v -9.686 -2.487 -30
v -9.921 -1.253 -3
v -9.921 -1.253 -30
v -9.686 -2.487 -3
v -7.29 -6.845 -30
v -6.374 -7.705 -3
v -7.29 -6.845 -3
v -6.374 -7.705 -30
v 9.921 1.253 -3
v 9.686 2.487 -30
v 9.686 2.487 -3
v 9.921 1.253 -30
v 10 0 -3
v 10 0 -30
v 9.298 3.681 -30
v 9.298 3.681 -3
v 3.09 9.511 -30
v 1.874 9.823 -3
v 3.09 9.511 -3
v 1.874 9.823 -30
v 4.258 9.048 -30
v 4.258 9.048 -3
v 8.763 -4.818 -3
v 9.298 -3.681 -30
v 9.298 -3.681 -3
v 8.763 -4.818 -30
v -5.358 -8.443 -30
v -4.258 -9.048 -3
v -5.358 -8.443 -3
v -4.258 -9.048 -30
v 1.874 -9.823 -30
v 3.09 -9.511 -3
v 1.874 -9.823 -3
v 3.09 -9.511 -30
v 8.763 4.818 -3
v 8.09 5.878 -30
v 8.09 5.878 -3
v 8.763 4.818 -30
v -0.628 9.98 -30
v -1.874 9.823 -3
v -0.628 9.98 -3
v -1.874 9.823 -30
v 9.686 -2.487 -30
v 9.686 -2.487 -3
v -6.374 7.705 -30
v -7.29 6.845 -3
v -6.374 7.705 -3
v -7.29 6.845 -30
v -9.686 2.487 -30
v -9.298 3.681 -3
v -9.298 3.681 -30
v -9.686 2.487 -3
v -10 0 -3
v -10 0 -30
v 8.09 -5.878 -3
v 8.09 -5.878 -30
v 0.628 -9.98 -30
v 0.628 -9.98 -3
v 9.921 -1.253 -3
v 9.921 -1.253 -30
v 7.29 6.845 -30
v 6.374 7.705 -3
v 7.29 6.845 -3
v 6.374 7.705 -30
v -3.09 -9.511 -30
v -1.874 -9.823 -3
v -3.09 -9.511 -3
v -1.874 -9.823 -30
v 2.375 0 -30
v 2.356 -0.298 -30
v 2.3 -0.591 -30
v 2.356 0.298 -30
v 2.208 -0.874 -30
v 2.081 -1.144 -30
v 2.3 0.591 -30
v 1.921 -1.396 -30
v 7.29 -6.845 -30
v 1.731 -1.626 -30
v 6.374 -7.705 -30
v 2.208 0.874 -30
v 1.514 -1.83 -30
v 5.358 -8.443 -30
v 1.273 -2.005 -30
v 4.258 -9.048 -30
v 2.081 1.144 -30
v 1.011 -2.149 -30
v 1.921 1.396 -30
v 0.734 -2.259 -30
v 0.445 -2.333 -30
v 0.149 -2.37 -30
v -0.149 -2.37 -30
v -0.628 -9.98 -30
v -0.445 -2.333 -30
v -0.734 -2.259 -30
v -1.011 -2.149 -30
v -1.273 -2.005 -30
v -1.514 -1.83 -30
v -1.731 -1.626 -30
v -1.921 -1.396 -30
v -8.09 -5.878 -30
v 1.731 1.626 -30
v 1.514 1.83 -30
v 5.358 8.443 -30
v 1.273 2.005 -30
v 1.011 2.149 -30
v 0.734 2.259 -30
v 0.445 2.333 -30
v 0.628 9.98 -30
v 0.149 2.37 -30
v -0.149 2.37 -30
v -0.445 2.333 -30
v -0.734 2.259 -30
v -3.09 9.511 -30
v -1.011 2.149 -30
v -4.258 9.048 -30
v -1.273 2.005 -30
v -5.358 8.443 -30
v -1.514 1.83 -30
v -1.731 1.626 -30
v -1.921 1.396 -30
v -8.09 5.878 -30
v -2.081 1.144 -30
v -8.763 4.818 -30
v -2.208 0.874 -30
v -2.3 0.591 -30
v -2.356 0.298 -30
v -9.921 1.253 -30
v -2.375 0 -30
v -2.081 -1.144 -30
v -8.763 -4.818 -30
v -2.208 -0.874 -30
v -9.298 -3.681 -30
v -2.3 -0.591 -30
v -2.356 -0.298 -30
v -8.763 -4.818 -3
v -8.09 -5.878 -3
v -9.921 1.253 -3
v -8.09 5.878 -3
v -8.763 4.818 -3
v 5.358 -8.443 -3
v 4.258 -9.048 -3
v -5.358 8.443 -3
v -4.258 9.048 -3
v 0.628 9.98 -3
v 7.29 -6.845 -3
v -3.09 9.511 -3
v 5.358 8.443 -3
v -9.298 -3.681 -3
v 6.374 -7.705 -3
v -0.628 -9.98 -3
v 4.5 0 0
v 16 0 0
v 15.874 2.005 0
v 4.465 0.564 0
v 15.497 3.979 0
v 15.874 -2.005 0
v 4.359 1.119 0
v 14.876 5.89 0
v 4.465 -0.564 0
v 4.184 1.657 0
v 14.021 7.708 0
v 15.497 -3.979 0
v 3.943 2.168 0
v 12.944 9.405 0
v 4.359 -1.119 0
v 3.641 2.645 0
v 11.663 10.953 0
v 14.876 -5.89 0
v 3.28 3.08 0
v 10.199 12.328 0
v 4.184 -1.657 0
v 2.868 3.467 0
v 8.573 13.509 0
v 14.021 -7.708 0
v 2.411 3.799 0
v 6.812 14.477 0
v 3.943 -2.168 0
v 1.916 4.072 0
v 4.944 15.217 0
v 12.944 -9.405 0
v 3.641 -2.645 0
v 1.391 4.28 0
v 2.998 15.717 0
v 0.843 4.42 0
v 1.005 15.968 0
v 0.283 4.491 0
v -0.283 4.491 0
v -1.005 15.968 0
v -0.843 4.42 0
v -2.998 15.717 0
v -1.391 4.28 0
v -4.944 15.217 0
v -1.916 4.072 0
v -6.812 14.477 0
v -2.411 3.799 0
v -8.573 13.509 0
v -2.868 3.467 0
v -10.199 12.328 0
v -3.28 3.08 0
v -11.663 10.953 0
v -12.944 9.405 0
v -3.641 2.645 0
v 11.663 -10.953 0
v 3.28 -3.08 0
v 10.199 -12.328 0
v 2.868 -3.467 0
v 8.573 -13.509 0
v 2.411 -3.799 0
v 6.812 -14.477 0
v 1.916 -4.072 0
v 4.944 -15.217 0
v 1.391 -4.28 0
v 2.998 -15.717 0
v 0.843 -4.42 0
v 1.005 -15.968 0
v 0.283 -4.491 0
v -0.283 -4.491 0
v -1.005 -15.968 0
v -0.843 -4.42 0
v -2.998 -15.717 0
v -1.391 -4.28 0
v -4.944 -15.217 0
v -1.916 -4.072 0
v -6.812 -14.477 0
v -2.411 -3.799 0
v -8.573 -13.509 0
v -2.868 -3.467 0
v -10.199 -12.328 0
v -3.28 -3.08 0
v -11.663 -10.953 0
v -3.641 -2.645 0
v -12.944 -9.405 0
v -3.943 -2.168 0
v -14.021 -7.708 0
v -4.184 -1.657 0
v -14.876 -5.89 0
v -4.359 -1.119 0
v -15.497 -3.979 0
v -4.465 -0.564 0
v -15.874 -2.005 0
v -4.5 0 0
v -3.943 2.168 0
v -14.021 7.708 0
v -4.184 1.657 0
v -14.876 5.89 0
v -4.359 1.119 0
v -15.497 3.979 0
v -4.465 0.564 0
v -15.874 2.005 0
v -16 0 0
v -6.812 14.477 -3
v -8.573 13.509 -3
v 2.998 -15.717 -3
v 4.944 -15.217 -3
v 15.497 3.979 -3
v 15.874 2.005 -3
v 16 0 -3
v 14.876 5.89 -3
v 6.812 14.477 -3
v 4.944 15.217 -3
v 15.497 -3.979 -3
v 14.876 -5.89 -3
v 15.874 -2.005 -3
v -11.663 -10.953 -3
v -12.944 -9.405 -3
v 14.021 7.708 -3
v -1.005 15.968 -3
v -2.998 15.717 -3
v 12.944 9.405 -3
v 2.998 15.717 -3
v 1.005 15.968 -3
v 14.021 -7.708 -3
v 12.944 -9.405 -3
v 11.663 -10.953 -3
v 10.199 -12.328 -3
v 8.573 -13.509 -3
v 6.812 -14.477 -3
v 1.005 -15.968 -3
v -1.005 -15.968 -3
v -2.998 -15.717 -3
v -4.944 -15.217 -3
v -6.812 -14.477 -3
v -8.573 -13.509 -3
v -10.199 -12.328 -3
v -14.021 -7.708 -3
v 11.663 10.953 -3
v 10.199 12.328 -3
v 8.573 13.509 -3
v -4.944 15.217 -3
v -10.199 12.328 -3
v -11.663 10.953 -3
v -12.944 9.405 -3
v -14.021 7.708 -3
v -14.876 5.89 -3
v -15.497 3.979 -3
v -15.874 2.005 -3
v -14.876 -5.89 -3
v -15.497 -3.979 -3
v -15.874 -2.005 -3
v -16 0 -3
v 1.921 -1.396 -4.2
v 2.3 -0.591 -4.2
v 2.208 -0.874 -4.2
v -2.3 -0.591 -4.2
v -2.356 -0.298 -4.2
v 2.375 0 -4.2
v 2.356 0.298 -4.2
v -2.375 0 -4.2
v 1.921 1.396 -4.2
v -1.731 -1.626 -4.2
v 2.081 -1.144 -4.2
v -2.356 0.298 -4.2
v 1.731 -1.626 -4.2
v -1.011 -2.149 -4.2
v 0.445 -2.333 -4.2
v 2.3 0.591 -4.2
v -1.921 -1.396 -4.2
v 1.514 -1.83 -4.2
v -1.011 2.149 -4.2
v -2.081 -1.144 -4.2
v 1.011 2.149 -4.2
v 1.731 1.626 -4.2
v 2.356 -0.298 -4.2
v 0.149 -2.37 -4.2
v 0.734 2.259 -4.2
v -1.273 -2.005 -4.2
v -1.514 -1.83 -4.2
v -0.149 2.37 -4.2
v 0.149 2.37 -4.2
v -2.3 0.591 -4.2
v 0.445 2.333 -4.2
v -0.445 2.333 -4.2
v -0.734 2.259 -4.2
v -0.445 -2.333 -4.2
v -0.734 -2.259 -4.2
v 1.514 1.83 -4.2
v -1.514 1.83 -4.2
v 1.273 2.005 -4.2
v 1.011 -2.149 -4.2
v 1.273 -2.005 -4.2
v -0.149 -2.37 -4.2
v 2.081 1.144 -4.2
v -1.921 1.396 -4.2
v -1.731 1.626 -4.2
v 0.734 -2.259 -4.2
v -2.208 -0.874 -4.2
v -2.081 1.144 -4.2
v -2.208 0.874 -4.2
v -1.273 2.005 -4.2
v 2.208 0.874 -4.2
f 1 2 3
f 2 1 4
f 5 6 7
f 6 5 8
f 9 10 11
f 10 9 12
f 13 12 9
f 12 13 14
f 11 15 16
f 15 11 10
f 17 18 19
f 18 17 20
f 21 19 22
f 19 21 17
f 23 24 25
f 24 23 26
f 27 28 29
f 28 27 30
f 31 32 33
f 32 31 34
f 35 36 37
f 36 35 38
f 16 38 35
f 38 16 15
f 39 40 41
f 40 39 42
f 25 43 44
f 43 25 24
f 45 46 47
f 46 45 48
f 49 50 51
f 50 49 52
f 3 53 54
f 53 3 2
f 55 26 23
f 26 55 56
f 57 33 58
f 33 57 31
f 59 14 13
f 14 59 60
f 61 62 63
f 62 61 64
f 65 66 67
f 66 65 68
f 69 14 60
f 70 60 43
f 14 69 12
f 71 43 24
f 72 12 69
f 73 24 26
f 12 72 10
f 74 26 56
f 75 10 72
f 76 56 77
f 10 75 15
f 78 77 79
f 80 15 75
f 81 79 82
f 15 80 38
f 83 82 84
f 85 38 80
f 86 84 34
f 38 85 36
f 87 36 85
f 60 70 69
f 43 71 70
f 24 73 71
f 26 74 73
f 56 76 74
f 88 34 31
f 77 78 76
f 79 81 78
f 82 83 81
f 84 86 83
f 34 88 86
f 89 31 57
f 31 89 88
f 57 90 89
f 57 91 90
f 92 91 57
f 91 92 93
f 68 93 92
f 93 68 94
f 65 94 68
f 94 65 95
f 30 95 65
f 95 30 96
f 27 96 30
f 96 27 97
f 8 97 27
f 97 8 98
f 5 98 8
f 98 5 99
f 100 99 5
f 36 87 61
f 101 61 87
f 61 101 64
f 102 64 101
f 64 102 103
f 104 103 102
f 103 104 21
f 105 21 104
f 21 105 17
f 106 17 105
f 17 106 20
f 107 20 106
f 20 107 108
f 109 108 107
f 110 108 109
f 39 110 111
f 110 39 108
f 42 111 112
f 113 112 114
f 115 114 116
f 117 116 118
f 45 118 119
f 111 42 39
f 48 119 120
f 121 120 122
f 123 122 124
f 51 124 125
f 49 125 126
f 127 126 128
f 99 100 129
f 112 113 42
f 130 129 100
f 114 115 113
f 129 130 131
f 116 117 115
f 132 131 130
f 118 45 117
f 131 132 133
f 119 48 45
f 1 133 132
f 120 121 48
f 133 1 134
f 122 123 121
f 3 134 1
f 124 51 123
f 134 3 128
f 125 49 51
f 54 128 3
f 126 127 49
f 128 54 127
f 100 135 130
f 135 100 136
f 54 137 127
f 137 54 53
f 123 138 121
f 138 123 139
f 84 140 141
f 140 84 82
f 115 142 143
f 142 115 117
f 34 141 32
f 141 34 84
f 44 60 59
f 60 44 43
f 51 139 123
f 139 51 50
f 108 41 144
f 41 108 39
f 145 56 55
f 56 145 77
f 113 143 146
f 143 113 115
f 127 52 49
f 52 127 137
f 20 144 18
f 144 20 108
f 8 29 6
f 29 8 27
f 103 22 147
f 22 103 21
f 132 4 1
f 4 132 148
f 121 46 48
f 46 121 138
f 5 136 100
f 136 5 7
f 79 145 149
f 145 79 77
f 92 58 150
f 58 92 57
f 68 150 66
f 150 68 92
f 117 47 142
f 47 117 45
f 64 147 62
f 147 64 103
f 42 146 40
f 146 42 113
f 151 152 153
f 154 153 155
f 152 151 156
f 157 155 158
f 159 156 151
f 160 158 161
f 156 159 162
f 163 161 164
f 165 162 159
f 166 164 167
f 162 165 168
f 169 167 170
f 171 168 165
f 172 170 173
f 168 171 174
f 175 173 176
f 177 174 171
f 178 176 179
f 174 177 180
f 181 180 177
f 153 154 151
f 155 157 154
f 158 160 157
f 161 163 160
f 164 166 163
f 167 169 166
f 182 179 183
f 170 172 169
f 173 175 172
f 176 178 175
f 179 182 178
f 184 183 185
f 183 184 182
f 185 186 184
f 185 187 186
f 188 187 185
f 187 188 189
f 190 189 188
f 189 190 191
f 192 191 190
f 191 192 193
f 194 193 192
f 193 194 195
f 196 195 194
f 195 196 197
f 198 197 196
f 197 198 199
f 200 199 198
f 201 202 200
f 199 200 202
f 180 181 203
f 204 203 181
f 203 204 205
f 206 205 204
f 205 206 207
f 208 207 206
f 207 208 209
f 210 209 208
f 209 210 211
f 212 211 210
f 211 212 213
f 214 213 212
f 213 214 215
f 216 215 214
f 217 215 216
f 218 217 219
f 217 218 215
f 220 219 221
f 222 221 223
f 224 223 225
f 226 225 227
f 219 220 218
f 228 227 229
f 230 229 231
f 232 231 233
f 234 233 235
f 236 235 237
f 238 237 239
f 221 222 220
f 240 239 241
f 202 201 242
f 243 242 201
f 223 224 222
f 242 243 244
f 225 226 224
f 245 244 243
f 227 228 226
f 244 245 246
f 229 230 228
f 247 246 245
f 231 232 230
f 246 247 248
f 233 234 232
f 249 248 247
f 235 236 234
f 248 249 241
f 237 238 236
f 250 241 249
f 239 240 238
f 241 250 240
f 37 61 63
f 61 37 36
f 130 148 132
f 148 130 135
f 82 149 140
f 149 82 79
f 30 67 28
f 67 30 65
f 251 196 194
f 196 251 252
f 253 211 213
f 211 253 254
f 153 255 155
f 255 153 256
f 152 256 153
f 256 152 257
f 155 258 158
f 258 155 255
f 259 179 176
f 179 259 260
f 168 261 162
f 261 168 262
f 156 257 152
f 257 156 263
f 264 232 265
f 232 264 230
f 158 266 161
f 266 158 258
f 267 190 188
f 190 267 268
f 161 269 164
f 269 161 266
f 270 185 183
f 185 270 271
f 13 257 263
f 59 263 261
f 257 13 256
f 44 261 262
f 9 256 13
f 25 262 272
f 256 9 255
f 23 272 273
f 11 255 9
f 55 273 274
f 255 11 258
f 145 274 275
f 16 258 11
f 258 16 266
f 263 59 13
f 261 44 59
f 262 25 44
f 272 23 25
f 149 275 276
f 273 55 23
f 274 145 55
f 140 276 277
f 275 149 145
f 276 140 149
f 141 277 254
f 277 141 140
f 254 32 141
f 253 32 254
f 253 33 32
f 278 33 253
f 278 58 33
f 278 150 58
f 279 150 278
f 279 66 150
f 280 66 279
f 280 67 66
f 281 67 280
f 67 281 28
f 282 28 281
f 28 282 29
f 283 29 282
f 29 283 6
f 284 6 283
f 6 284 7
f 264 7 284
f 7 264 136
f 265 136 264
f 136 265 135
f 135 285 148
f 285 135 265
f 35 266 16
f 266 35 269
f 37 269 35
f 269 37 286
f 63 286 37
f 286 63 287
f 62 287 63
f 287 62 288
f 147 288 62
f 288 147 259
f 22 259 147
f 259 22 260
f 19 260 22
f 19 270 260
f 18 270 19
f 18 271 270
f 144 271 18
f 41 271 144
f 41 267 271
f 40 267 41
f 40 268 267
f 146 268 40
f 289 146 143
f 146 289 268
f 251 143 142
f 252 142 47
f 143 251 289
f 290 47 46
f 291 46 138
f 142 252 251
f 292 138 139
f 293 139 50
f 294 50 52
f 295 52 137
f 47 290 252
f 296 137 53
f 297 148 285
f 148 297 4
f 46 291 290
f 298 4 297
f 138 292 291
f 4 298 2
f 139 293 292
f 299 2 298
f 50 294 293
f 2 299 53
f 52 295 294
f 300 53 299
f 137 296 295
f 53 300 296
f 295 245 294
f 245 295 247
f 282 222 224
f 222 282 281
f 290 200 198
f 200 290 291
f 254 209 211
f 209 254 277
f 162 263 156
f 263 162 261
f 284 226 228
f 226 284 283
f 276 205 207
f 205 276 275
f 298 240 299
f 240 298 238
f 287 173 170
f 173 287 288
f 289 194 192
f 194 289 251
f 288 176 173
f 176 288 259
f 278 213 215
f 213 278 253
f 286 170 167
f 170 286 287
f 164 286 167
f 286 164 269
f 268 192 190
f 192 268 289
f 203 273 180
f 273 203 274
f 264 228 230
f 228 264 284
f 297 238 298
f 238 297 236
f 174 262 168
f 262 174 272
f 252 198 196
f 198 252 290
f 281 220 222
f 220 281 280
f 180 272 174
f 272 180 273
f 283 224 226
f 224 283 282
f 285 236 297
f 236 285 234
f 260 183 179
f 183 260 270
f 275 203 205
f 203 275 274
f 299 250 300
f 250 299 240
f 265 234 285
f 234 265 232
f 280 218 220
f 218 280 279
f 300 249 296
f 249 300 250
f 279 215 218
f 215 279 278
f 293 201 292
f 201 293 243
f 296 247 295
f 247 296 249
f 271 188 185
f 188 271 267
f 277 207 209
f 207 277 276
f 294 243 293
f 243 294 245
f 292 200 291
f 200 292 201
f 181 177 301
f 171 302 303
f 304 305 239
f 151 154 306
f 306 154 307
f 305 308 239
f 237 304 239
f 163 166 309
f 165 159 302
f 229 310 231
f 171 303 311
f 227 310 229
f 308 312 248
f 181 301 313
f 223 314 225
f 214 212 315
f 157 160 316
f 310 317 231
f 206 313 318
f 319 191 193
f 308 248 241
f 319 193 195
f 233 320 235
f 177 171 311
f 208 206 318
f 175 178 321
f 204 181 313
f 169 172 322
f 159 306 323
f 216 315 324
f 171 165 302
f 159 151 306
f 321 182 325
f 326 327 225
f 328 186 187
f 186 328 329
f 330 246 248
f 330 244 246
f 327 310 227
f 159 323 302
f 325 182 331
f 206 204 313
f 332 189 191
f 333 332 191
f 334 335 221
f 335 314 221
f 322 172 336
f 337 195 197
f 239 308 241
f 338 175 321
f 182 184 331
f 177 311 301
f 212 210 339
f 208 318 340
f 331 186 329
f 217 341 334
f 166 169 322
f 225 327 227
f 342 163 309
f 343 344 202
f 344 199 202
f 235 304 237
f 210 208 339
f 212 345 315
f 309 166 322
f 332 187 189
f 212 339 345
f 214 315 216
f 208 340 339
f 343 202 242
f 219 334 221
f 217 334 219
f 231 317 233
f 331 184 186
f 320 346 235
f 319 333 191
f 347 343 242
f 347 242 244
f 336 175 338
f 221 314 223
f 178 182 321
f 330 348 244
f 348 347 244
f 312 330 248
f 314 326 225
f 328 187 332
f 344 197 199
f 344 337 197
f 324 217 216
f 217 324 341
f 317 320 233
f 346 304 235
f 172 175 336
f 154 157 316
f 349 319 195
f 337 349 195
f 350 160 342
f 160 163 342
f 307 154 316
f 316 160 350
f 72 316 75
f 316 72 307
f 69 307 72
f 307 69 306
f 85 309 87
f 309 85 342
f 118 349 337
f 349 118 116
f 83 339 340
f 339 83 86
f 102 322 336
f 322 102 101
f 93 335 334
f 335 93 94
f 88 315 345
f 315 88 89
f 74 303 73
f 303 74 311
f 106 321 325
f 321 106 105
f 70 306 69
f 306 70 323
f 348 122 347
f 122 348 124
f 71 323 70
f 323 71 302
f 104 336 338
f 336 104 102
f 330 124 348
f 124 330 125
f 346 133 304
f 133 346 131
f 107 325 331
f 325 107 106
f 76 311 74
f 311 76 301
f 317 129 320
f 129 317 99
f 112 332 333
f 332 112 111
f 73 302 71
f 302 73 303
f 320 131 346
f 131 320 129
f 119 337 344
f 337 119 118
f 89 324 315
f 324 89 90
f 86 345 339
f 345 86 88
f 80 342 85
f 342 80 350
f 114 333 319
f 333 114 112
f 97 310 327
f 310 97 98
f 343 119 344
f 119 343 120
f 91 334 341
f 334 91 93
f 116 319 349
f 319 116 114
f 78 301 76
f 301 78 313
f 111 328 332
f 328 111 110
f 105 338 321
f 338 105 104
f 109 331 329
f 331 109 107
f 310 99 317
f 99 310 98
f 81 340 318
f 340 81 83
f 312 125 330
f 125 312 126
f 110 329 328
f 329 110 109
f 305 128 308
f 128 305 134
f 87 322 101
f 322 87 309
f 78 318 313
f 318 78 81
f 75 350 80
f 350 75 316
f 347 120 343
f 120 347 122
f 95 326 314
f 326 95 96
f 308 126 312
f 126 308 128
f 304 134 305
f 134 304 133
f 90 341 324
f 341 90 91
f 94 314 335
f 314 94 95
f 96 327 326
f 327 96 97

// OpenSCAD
$fn = 50;


difference() {
	union() {
		translate(v = [0, 0, -30.0000000000]) {
			cylinder(h = 30, r = 10.0000000000);
		}
		translate(v = [0, 0, -3.0000000000]) {
			cylinder(h = 3, r = 16.0000000000);
		}
	}
	union() {
		translate(v = [0, 0, 0]) {
			rotate(a = [0, 0, 0]) {
				difference() {
					union() {
						#translate(v = [0, 0, -30.0000000000]) {
							cylinder(h = 30, r = 2.2500000000);
						}
						#translate(v = [0, 0, -4.2000000000]) {
							cylinder(h = 4.2000000000, r1 = 2.3750000000, r2 = 4.5000000000);
						}
						#translate(v = [0, 0, -30.0000000000]) {
							cylinder(h = 30, r = 2.3750000000);
						}
						#translate(v = [0, 0, -30.0000000000]) {
							cylinder(h = 30, r = 2.2500000000);
						}
					}
					union();
				}
			}
		}
	}
}
